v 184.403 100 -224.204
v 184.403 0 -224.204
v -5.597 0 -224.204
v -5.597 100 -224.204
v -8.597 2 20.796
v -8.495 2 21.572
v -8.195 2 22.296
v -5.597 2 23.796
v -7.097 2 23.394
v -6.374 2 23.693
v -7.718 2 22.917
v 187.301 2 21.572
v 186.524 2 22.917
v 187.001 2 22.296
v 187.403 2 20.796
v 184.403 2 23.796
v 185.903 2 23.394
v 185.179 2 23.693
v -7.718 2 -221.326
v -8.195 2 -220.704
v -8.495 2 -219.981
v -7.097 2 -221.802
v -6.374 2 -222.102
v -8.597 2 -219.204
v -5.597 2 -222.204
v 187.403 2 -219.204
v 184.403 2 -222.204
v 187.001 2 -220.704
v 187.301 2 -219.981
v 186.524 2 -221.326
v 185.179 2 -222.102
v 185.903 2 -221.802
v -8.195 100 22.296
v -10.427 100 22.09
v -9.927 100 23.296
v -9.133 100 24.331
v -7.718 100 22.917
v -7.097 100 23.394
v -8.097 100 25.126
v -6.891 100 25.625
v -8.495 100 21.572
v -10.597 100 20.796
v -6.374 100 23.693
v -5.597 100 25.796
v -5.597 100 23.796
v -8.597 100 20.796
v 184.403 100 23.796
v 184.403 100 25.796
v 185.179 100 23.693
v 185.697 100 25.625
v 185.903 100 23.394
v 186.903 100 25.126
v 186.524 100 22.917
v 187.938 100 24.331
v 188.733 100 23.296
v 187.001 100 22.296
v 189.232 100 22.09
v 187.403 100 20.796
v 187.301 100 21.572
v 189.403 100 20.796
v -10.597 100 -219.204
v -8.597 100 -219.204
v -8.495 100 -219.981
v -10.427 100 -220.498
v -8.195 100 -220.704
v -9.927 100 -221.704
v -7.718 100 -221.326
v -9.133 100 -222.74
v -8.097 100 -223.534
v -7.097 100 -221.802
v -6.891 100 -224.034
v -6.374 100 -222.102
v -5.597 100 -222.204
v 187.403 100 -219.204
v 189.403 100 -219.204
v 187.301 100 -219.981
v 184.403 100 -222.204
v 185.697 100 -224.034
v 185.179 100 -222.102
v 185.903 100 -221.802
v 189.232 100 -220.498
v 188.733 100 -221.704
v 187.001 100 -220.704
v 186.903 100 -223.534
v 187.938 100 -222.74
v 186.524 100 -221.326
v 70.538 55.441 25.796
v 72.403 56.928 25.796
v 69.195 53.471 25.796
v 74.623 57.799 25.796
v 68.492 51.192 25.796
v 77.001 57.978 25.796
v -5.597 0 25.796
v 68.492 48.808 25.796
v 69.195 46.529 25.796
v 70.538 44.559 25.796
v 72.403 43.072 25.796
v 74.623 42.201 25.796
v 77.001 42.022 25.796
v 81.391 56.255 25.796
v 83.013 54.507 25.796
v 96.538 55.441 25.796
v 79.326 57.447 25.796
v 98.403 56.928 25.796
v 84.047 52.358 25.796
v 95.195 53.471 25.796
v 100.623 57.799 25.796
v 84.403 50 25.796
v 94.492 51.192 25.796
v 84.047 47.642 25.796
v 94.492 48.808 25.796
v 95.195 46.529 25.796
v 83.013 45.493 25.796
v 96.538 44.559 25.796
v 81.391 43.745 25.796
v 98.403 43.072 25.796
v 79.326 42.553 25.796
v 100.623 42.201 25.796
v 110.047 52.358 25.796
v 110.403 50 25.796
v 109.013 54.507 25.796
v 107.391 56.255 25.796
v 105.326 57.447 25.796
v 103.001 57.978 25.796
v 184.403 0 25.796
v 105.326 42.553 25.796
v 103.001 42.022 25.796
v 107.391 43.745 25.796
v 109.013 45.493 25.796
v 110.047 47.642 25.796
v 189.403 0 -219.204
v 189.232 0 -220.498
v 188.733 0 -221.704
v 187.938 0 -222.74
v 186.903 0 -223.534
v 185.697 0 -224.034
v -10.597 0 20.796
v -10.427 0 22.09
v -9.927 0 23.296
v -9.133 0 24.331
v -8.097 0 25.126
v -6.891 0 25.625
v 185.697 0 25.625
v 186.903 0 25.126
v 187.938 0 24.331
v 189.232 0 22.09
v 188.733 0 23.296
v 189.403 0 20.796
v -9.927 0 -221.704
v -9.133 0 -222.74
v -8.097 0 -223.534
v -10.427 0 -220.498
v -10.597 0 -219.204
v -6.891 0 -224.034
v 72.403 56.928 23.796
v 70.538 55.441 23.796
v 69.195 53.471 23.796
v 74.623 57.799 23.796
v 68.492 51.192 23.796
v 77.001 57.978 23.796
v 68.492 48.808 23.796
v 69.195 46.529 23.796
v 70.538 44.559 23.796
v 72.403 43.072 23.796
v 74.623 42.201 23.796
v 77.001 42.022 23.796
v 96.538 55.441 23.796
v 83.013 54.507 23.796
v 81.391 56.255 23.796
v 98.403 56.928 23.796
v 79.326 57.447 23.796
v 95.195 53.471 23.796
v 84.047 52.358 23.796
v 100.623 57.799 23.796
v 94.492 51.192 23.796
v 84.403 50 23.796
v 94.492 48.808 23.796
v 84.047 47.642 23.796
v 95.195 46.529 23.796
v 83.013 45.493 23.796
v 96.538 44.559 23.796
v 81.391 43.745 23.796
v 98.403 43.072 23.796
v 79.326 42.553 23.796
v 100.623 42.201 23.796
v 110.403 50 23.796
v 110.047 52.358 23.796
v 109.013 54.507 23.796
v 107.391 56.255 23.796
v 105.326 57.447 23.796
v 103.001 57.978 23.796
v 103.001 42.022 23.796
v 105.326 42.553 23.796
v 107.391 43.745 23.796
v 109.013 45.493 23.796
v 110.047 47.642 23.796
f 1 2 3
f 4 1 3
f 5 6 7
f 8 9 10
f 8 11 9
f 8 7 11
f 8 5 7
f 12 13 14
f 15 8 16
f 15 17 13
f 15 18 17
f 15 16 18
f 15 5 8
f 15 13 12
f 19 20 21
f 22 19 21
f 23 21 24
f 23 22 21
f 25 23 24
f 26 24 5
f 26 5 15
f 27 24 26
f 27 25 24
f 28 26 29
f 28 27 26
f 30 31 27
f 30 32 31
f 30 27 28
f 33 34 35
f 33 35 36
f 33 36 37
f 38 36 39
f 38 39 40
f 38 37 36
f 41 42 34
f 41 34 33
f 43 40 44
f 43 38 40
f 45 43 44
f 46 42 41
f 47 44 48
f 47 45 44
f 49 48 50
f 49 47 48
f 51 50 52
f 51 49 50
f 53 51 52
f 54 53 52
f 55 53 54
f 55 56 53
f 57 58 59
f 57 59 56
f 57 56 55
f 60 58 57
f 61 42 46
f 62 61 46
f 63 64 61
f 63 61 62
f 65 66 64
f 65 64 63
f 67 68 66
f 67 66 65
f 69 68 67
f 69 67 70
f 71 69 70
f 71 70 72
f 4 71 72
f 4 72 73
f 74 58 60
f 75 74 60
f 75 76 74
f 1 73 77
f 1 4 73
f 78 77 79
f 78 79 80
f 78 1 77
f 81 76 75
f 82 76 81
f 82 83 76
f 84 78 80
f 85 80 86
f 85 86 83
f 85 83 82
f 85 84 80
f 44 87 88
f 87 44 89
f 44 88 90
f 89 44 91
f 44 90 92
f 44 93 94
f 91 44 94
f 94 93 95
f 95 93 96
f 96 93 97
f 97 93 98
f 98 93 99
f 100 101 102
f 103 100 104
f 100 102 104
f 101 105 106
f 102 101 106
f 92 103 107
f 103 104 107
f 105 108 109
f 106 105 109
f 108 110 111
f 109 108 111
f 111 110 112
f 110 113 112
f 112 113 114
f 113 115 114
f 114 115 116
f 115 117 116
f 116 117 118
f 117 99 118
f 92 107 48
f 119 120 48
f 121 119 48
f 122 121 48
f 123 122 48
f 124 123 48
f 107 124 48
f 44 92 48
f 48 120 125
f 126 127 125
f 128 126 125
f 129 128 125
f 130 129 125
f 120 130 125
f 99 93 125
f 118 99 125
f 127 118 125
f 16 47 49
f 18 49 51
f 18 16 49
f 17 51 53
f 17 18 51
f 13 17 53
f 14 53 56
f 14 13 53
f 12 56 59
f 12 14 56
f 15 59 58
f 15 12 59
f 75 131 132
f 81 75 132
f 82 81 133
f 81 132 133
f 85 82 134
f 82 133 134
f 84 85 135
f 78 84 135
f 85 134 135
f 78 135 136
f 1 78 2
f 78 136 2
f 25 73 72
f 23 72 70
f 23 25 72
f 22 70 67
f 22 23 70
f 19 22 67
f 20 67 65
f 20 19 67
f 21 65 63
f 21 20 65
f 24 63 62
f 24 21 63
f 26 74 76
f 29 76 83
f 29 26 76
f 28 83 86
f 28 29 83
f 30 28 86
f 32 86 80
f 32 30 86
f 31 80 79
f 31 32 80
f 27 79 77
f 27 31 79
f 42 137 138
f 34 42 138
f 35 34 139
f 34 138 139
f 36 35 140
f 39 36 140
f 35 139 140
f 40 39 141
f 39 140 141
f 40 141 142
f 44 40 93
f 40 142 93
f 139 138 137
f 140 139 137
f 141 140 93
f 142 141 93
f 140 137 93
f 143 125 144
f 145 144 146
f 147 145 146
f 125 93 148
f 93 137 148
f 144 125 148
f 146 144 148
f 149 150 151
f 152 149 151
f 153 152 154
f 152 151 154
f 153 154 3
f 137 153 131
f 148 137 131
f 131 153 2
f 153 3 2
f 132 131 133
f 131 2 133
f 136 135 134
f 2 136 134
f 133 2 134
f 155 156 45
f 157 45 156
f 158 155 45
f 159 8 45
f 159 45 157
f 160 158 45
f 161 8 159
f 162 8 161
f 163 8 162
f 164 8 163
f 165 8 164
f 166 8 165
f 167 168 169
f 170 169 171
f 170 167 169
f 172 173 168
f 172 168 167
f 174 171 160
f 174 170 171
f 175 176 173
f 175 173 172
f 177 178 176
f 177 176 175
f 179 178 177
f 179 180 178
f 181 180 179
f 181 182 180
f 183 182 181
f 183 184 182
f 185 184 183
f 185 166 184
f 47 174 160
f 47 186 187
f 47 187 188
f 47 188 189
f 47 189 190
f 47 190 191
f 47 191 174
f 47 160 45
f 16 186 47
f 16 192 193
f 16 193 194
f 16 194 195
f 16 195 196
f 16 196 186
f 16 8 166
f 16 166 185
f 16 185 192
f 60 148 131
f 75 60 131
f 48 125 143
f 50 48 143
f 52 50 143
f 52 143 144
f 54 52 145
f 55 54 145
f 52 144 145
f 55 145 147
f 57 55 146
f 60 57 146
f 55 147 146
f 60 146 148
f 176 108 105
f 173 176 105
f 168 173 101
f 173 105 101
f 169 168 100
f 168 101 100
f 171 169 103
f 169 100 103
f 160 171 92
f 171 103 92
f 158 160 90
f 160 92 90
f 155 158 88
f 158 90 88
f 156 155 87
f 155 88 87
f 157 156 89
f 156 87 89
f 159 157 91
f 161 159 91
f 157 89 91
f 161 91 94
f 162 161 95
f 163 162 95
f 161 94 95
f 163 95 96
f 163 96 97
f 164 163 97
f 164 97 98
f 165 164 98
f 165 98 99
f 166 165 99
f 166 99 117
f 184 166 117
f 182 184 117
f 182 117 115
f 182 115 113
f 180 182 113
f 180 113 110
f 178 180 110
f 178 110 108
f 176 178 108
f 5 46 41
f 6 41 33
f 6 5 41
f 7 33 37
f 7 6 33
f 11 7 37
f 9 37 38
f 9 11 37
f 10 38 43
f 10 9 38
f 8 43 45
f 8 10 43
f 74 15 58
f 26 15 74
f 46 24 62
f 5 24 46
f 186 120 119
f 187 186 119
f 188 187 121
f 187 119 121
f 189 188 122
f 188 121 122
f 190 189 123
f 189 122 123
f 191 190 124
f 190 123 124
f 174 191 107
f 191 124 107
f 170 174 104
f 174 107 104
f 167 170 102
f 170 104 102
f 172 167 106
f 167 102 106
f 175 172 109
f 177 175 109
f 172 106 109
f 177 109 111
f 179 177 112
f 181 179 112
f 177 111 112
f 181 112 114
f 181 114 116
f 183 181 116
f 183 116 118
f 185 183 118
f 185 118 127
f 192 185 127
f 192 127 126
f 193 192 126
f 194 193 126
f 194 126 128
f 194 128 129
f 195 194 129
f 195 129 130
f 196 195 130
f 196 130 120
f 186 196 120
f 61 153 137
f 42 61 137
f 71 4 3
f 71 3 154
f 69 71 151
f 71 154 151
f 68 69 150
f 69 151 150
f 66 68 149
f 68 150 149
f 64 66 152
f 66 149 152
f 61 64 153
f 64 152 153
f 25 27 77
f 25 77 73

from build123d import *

# Parameters (mm, degrees)
BOSS_EXTRUDE2_DEPTH = 100
SHELL2_T            = -2
SKETCH5_R           = 8
CUT_EXTRUDE1_DEPTH  = 100


with BuildPart() as part:
    # Sketch3 → Boss-Extrude2 (new body)
    with BuildSketch(Plane(origin=(0, 0, 0), x_dir=(1, 0, 0), z_dir=(0, 1, 0))):
        with BuildLine():
            Line((184.402855292, 224.204318802), (89.402855292, 224.204318802))
            Line((89.402855292, 224.204318802), (-5.597144708, 224.204318802))
            ThreePointArc((-5.597144708, 224.204318802), (-9.132678614, 222.739852708), (-10.597144708, 219.204318802))
            Line((-10.597144708, 219.204318802), (-10.597144708, -20.795681198))
            ThreePointArc((-10.597144708, -20.795681198), (-9.132678614, -24.331215104), (-5.597144708, -25.795681198))
            Line((-5.597144708, -25.795681198), (89.402855292, -25.795681198))
            Line((89.402855292, -25.795681198), (184.402855292, -25.795681198))
            ThreePointArc((184.402855292, -25.795681198), (187.938389198, -24.331215104), (189.402855292, -20.795681198))
            Line((189.402855292, -20.795681198), (189.402855292, 219.204318802))
            ThreePointArc((189.402855292, 219.204318802), (187.938389198, 222.739852708), (184.402855292, 224.204318802))
        make_face()
    extrude(amount=BOSS_EXTRUDE2_DEPTH)

    # Shell2
    shell2_openings = [part.faces().sort_by_distance(p)[0] for p in [
        (89.402855292, 100, -99.204318802),
    ]]
    offset(amount=SHELL2_T, openings=shell2_openings, kind=Kind.INTERSECTION)

    # Sketch5 → Cut-Extrude1 (cut)
    with BuildSketch(Plane.XY.offset(25.795681198)):
        with Locations((76.402855292, 50)):
            Circle(SKETCH5_R)
        with Locations((102.402855292, 50)):
            Circle(SKETCH5_R)
    extrude(amount=-CUT_EXTRUDE1_DEPTH, mode=Mode.SUBTRACT)


solid = part.part
